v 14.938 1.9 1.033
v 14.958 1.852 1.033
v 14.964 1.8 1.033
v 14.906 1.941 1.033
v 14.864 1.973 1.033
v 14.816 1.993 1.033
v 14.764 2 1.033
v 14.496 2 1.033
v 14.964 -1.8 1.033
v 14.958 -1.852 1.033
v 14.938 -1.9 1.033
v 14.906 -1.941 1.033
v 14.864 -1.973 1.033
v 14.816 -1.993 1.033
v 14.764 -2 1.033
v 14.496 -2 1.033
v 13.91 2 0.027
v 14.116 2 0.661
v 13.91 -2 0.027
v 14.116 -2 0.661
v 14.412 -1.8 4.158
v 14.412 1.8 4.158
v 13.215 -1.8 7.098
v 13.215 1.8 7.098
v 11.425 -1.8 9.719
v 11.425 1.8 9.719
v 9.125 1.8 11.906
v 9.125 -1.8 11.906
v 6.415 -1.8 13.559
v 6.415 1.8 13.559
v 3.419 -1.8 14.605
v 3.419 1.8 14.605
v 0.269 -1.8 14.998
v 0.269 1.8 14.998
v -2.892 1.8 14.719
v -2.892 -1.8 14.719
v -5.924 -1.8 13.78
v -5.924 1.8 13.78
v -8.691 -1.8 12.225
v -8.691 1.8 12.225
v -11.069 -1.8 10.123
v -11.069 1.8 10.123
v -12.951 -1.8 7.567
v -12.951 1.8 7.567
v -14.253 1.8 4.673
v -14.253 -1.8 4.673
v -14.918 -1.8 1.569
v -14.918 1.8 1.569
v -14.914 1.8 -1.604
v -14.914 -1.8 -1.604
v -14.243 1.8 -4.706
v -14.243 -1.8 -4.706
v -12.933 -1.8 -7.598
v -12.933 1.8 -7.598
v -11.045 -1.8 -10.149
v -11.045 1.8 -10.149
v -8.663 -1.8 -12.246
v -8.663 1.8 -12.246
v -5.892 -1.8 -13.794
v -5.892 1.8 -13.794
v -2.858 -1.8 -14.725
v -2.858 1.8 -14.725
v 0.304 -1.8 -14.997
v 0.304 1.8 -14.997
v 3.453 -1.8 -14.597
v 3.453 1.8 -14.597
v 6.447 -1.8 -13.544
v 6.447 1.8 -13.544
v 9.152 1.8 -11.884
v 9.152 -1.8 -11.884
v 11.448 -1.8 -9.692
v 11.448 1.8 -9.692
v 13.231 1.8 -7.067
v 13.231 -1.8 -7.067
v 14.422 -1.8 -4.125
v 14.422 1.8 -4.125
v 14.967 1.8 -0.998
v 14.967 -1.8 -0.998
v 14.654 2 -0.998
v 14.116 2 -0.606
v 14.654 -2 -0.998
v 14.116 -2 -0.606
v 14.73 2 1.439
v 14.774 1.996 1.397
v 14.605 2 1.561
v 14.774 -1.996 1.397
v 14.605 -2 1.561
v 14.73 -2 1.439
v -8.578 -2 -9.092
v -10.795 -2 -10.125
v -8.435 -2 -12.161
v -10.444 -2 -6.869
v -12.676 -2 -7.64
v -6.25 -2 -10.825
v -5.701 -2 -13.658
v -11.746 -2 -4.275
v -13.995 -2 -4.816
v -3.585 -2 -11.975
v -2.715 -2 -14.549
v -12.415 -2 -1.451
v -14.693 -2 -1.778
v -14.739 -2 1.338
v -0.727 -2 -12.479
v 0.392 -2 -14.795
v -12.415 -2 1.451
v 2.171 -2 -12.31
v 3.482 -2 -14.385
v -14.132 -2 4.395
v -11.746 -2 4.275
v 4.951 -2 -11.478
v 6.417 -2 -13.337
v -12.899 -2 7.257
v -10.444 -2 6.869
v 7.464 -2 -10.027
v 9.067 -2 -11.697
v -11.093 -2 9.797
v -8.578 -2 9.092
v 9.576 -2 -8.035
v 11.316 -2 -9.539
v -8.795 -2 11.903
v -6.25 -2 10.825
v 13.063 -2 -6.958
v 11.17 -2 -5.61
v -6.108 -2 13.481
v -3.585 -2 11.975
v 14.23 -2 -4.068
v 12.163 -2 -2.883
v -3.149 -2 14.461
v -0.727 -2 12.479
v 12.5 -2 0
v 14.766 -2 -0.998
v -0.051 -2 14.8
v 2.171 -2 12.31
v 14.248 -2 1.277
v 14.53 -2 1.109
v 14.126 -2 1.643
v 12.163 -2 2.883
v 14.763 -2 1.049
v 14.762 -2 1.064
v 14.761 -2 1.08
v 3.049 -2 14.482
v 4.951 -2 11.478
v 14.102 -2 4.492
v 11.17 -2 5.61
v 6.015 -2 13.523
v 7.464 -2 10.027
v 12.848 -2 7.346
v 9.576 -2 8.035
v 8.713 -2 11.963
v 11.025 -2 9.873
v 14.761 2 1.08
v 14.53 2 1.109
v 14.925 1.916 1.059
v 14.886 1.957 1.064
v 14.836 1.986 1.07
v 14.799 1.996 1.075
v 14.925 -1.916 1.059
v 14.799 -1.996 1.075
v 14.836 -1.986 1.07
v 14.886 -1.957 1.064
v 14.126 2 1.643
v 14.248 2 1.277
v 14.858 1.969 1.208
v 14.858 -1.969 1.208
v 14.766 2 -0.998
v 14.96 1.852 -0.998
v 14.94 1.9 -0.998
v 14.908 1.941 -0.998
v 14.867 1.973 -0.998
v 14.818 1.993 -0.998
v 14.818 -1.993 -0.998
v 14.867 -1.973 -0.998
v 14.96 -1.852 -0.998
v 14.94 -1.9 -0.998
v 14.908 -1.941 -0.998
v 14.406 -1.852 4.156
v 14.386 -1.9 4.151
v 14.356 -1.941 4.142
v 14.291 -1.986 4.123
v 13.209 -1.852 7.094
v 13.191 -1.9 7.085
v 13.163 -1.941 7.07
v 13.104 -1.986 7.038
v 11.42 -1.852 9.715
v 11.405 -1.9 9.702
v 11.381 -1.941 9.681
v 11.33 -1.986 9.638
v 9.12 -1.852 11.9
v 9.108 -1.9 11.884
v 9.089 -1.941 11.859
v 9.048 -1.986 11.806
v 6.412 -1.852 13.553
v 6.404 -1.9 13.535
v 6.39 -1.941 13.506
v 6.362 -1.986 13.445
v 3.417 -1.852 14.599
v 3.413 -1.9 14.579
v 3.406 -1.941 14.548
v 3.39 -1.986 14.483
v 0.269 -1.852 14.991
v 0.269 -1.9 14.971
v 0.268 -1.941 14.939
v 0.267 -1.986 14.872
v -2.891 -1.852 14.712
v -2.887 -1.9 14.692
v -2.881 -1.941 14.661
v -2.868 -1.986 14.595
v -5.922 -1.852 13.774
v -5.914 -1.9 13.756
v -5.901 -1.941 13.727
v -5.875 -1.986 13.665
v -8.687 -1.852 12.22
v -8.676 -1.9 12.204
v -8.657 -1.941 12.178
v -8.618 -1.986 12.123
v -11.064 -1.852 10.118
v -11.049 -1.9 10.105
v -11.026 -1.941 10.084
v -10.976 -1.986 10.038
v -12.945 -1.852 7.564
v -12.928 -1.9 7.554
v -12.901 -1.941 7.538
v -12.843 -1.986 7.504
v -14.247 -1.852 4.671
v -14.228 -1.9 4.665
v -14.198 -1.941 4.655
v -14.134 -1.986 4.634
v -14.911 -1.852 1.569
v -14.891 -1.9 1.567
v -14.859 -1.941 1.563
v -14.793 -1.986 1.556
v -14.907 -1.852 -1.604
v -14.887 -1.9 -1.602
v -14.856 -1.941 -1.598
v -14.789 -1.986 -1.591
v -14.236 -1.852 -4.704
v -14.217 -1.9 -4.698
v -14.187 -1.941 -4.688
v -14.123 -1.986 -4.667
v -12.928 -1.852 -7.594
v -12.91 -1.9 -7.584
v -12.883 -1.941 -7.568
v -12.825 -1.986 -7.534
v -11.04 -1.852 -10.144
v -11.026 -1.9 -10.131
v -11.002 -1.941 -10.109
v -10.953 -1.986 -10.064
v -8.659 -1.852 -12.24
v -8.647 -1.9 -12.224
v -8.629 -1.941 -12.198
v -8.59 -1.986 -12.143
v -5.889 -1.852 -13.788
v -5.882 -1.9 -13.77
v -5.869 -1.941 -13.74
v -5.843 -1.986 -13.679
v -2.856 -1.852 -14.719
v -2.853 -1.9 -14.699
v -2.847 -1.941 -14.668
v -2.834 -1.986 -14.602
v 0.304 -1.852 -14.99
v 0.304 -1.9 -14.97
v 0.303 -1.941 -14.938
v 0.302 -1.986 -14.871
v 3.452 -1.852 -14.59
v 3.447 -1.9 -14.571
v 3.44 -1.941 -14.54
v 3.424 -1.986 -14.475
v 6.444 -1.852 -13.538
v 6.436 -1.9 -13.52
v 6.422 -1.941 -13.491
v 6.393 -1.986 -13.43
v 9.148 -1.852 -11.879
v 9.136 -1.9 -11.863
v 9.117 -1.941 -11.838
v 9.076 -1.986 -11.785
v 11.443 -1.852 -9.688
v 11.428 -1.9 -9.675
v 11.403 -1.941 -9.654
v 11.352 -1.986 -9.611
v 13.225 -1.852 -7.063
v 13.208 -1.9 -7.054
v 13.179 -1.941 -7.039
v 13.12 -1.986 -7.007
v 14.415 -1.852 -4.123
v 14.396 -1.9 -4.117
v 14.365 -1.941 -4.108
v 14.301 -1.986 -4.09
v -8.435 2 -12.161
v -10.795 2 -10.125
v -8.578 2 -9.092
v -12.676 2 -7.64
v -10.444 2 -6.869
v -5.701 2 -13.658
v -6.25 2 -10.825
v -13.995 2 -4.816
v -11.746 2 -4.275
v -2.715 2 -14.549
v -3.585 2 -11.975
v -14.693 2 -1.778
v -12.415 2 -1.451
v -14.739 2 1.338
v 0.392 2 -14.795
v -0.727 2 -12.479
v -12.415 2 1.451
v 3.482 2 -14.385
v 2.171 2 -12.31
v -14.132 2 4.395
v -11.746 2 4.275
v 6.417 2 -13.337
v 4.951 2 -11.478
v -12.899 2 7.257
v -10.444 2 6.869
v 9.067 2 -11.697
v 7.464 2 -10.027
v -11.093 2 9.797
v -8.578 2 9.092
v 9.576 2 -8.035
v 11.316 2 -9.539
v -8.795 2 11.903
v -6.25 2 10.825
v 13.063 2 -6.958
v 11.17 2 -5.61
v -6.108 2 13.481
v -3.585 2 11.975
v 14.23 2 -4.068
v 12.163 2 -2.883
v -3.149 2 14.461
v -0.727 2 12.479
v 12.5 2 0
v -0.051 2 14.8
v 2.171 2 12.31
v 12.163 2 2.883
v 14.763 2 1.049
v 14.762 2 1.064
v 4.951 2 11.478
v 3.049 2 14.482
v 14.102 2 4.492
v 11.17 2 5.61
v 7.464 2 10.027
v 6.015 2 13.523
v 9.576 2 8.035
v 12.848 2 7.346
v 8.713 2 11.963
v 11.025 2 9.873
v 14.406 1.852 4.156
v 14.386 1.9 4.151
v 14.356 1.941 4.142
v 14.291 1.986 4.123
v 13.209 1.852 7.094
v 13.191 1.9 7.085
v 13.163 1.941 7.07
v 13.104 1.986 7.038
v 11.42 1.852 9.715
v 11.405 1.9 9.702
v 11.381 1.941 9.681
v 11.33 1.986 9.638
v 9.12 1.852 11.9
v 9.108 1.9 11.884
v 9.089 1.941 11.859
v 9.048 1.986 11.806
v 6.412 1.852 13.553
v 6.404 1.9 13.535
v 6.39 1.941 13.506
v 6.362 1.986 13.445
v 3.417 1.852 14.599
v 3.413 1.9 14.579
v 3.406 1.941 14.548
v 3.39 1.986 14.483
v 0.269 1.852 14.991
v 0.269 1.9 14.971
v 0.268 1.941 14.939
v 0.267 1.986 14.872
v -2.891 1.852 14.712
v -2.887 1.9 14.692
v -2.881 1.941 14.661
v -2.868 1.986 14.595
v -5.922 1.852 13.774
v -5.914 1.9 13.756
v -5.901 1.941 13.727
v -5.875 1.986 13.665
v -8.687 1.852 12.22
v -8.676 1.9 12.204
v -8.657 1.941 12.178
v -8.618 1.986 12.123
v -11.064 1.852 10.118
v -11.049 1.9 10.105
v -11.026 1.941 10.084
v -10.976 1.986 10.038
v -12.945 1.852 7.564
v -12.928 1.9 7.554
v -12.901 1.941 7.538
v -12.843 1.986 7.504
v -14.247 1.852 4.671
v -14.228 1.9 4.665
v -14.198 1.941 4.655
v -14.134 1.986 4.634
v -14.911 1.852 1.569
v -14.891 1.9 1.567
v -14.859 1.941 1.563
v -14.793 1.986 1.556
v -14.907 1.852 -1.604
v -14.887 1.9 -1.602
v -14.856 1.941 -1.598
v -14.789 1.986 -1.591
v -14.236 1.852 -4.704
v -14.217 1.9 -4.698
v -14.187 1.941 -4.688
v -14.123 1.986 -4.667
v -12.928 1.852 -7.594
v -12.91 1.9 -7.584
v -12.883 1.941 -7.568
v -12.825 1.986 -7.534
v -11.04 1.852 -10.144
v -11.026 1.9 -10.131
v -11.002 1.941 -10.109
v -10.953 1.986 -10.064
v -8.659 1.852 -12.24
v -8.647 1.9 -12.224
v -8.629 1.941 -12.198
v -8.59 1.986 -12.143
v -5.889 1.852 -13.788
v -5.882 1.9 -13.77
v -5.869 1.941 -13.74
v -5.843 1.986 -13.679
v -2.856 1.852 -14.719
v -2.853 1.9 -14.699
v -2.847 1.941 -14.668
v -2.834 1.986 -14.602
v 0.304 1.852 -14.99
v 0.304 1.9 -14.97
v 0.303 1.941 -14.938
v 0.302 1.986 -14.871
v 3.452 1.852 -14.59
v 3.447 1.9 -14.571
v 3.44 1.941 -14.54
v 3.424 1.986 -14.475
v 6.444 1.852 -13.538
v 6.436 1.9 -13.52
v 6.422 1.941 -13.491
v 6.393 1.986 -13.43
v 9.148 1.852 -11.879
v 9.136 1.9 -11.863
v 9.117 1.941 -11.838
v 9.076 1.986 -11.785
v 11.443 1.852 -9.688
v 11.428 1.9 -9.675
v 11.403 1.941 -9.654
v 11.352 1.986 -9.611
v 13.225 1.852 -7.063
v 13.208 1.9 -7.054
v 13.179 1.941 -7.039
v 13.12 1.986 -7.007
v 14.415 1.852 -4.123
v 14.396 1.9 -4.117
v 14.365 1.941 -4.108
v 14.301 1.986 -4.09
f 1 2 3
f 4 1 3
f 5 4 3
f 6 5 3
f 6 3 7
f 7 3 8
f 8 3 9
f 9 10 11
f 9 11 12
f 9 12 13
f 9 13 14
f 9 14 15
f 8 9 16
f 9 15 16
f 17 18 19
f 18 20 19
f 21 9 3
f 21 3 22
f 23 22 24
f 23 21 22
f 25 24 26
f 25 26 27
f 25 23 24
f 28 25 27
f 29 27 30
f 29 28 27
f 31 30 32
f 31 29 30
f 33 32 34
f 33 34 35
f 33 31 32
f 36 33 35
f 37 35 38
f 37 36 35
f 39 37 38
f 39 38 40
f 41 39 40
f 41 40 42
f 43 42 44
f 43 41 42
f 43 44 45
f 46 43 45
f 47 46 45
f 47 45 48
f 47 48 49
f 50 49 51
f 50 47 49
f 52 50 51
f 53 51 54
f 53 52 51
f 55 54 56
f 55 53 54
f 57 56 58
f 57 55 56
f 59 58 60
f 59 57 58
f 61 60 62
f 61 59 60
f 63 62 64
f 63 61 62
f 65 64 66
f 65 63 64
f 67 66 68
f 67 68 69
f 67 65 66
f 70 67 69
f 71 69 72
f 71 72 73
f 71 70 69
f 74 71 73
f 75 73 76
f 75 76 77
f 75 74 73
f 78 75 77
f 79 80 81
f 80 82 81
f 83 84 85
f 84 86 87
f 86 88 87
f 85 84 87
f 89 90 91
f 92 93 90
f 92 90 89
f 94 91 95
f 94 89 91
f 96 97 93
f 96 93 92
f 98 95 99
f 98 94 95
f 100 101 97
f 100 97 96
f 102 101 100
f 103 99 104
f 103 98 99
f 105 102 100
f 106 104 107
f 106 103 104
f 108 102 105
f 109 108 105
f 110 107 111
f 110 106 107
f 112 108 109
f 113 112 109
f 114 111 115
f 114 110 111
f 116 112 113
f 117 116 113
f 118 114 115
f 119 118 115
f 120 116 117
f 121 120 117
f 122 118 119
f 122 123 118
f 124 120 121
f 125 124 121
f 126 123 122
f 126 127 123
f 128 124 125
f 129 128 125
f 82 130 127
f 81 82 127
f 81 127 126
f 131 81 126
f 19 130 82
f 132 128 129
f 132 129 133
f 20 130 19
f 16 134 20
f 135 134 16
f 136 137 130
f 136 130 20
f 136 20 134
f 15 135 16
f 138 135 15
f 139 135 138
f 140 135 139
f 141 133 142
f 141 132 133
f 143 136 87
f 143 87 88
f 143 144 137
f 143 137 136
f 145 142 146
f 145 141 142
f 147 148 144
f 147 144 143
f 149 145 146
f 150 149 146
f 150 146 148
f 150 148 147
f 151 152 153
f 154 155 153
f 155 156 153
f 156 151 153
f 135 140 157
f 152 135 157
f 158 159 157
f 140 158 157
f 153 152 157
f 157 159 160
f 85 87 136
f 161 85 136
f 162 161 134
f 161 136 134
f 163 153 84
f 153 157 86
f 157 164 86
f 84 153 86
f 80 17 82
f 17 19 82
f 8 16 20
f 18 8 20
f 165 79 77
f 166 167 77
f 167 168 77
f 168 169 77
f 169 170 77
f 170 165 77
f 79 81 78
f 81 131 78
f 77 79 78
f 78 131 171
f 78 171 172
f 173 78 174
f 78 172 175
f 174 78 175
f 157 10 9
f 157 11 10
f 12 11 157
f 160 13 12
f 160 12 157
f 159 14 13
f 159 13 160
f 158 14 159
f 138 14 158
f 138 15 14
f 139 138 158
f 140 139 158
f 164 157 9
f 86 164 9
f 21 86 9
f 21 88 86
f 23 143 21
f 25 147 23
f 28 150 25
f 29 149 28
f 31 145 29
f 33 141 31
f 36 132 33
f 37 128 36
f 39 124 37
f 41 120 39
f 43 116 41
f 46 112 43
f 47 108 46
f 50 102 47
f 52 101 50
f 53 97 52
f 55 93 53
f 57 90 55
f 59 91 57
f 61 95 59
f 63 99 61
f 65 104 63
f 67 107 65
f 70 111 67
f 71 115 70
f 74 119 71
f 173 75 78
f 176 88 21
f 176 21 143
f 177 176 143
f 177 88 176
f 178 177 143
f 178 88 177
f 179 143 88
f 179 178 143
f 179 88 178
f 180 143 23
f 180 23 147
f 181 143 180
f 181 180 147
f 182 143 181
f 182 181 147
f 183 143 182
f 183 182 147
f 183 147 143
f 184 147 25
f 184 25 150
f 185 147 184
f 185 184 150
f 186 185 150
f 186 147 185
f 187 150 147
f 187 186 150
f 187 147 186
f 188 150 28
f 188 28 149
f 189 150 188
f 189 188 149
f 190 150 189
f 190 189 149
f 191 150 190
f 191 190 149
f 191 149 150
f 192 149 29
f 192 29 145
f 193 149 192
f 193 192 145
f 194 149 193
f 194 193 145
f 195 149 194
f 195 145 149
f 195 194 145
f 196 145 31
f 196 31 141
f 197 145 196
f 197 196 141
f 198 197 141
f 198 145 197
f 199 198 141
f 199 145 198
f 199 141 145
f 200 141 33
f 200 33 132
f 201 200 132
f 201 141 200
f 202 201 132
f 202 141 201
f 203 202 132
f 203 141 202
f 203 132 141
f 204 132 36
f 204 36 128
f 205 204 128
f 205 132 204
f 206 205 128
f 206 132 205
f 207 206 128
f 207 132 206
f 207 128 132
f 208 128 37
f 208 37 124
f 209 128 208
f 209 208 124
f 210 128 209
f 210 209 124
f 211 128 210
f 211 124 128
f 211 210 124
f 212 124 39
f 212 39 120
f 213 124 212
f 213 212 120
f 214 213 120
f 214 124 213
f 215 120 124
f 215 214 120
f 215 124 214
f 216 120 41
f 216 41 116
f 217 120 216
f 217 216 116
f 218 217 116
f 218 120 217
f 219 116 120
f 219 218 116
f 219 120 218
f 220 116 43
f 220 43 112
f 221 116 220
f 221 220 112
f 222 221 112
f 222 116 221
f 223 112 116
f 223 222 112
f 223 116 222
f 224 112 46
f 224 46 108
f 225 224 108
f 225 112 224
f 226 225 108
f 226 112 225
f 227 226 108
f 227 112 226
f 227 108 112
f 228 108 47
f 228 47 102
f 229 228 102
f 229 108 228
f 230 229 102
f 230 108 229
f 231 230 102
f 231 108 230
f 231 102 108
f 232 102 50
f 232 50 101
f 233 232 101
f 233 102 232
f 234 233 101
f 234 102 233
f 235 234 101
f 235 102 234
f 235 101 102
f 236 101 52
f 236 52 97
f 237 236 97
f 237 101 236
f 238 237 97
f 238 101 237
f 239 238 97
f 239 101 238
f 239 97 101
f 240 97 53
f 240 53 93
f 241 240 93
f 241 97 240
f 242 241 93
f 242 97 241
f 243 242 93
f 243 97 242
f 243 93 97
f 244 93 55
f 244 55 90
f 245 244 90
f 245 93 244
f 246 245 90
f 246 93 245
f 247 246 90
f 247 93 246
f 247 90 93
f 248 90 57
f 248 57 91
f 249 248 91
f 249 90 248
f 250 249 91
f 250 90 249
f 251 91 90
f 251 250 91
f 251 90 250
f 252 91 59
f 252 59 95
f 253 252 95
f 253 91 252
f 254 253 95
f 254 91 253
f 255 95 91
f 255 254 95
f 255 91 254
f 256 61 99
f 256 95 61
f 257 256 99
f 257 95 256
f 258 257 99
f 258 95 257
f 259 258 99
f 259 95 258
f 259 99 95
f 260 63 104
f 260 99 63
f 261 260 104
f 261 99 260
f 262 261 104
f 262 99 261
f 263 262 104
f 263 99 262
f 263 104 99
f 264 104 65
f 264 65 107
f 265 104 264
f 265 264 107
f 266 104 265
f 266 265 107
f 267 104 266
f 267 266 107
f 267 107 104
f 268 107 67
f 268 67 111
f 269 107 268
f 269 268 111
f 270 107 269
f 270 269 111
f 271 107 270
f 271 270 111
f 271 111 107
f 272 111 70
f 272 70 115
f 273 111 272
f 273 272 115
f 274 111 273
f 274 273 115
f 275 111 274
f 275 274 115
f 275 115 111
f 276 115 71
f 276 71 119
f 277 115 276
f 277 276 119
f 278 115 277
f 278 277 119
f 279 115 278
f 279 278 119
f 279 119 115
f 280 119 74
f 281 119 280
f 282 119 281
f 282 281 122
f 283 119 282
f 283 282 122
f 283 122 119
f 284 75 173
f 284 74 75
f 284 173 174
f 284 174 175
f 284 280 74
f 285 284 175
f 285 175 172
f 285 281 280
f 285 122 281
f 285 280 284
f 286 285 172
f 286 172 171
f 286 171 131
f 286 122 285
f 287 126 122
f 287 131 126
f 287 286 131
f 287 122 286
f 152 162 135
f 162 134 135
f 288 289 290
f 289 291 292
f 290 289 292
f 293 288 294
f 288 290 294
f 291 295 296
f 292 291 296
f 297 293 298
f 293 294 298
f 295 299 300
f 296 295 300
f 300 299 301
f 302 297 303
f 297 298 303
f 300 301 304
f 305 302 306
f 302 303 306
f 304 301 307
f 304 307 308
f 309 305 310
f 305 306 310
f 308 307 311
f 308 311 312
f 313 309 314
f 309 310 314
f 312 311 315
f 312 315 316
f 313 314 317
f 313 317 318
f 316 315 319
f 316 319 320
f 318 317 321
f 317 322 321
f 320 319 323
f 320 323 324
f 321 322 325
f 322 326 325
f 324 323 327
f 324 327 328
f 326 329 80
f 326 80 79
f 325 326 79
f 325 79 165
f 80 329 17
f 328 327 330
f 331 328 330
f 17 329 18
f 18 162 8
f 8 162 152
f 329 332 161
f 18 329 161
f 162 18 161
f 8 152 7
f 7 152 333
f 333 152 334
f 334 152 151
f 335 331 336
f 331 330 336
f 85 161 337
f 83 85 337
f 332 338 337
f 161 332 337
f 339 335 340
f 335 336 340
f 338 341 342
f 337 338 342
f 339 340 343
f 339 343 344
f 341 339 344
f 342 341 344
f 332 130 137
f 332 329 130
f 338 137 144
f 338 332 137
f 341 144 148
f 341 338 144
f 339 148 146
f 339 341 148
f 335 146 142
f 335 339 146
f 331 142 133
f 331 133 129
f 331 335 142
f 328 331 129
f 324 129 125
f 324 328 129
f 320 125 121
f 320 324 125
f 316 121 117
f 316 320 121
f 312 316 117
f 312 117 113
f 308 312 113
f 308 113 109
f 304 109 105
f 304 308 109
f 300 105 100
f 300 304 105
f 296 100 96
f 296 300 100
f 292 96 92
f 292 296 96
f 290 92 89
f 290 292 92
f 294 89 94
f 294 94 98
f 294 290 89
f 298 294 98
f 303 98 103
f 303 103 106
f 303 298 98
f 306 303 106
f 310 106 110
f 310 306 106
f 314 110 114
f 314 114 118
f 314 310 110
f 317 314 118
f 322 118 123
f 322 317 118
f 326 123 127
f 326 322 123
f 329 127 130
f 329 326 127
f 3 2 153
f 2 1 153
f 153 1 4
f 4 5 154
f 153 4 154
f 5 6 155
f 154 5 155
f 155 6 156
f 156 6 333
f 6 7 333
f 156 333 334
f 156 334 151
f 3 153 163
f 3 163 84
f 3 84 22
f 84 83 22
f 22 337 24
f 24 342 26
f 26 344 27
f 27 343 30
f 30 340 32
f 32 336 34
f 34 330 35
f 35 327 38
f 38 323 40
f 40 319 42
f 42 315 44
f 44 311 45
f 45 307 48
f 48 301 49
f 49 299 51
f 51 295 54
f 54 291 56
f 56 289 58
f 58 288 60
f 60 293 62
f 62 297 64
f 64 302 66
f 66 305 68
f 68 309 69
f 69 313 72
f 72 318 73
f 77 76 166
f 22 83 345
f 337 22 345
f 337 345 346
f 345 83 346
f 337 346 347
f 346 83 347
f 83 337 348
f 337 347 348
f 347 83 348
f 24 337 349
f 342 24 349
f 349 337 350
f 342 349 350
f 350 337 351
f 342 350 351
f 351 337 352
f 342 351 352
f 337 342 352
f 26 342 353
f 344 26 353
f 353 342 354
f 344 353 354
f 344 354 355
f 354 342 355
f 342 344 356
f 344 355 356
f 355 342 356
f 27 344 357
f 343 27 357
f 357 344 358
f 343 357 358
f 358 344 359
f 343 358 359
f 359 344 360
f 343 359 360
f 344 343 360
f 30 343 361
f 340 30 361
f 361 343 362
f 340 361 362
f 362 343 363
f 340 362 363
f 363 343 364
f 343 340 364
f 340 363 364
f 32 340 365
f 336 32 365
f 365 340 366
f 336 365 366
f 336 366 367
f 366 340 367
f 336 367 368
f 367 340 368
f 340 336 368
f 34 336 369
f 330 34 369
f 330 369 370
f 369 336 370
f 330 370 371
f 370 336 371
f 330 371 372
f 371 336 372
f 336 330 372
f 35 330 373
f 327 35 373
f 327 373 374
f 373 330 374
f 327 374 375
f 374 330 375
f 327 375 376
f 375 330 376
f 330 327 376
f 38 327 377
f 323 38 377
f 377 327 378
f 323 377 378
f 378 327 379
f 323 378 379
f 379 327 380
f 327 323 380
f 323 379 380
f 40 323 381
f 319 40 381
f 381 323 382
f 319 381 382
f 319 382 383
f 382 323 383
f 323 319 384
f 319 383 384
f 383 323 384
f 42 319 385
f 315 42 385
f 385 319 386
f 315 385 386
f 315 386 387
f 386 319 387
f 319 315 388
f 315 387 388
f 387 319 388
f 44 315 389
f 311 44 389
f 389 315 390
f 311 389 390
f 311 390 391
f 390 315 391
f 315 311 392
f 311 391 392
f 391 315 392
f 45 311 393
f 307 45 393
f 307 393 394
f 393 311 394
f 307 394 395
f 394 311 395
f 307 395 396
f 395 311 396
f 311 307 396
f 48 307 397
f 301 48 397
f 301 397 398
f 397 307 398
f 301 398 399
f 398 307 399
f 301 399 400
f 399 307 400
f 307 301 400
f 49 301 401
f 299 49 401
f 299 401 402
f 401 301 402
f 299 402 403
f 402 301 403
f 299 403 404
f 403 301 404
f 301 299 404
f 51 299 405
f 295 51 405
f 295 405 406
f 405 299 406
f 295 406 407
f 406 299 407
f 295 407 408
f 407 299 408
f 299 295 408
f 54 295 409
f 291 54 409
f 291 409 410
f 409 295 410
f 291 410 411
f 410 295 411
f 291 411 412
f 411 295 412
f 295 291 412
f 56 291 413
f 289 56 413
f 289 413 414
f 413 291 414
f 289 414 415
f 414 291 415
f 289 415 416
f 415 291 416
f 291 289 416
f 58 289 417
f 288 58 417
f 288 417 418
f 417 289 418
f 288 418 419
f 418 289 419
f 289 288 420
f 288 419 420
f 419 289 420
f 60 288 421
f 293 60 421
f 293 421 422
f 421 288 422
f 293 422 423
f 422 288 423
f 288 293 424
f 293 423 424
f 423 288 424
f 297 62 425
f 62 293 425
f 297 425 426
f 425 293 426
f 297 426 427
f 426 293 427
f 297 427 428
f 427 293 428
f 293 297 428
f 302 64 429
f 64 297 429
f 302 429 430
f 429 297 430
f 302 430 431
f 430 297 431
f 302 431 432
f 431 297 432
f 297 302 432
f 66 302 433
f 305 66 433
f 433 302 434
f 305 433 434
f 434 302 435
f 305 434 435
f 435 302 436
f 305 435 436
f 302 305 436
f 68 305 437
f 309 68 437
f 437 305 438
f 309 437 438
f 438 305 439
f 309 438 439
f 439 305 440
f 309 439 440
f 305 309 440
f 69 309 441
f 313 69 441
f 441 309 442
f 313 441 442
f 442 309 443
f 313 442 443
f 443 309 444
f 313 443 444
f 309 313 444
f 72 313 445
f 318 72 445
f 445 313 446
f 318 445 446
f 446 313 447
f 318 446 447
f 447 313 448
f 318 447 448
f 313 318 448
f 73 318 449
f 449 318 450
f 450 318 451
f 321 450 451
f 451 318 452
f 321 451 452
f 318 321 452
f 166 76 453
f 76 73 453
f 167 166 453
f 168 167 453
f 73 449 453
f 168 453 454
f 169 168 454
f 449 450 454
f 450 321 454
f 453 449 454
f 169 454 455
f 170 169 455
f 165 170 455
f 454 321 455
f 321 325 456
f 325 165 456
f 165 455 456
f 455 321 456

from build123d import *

# Parameters (mm, degrees)
F0_R        = 15
F0_R_2      = 12.5
F2_DEPTH    = 2
F3_DEPTH    = 2
F5_T2_ANGLE = 356.0811167668
F5_T4_ANGLE = 356.0811167668


# Not quite as in the source:
# - a fillet or chamfer that OpenCascade refuses, or shapes differently, is made with other operations: its cross-section is extruded or revolved along the edge and cut away or added


with BuildPart() as f2:
    # F0 (on Front) → F2 (new body, symmetric)
    with BuildSketch(Plane.XZ):
        Circle(F0_R)
        Circle(F0_R_2, mode=Mode.SUBTRACT)
    extrude(amount=F2_DEPTH, both=True)


with BuildPart() as f3:
    # F1 (on Front) → F3 (new body, symmetric)
    with BuildSketch(Plane.XZ):
        Polygon((14.1155660557, -0.6062071938), (14.654473997, -0.9977467319), (15.3206008461, -0.9977467319), (15.8595087875, -0.6062071938), (16.0653533043, 0.0273170867), (15.8595087875, 0.6608413673), (15.4207458886, 1.032837417), (14.98814394, 1.032837417), (14.4956499742, 1.032837417), (14.1155660557, 0.6608413673), (13.9097215389, 0.0273170867), align=None)
    extrude(amount=F3_DEPTH, both=True)


with BuildPart() as f3b:
    # F1 (on Front) → F3, piece 2 (new body, symmetric)
    with BuildSketch(Plane.XZ):
        Polygon((14.5303690806, 1.108682598), (14.9253355339, 1.0592561448), (14.7739350796, 1.3965530088), (14.6046532318, 1.5607766109), (14.1262672842, 1.6433858545), (14.2477648333, 1.2773335911), align=None)
    extrude(amount=F3_DEPTH, both=True)


with BuildPart() as f3c:
    # F1 (on Front) → F3, piece 3 (new body, symmetric)
    with BuildSketch(Plane.XZ):
        Polygon((15.1731697154, 1.4260609763), (14.9909034371, 1.0592561448), (15.3603749383, 1.0987263252), (15.5725924471, 1.2016314485), (15.8138373742, 1.622913168), (15.4283061543, 1.6339400652), align=None)
    extrude(amount=F3_DEPTH, both=True)


with BuildPart() as f2_1:
    add(f2.part)

    # F4: cut F3, F3c, F3b
    add(f3.part, mode=Mode.SUBTRACT)
    add(f3c.part, mode=Mode.SUBTRACT)
    add(f3b.part, mode=Mode.SUBTRACT)

    # F5: fillet of radius 0.2 on 2 edges, made by hand

    # F5_s1 → F5_t2 (revolve, cut)
    with BuildSketch(Plane(origin=(0, 0, 0), x_dir=(0, 1, 0), z_dir=(0.0353637111, 0, -0.9993745084))):
        with BuildLine():
            ThreePointArc((-1.8, 15), (-1.9414213562, 14.9414213562), (-2, 14.8))
            Line((-2, 14.8), (-2, 15))
            Line((-2, 15), (-1.8, 15))
        make_face()
    revolve(axis=Axis((0, -2, 0), (0, -1, 0)), revolution_arc=F5_T2_ANGLE, mode=Mode.SUBTRACT)

    # F5_s3 → F5_t4 (revolve, cut)
    with BuildSketch(Plane(origin=(0, 0, 0), x_dir=(0, 1, 0), z_dir=(0.0353637111, 0, -0.9993745084))):
        with BuildLine():
            ThreePointArc((1.8, 15), (1.9414213562, 14.9414213562), (2, 14.8))
            Line((2, 14.8), (2, 15))
            Line((2, 15), (1.8, 15))
        make_face()
    revolve(axis=Axis((0, 2, 0), (0, -1, 0)), revolution_arc=F5_T4_ANGLE, mode=Mode.SUBTRACT)


solid = f2_1.part
